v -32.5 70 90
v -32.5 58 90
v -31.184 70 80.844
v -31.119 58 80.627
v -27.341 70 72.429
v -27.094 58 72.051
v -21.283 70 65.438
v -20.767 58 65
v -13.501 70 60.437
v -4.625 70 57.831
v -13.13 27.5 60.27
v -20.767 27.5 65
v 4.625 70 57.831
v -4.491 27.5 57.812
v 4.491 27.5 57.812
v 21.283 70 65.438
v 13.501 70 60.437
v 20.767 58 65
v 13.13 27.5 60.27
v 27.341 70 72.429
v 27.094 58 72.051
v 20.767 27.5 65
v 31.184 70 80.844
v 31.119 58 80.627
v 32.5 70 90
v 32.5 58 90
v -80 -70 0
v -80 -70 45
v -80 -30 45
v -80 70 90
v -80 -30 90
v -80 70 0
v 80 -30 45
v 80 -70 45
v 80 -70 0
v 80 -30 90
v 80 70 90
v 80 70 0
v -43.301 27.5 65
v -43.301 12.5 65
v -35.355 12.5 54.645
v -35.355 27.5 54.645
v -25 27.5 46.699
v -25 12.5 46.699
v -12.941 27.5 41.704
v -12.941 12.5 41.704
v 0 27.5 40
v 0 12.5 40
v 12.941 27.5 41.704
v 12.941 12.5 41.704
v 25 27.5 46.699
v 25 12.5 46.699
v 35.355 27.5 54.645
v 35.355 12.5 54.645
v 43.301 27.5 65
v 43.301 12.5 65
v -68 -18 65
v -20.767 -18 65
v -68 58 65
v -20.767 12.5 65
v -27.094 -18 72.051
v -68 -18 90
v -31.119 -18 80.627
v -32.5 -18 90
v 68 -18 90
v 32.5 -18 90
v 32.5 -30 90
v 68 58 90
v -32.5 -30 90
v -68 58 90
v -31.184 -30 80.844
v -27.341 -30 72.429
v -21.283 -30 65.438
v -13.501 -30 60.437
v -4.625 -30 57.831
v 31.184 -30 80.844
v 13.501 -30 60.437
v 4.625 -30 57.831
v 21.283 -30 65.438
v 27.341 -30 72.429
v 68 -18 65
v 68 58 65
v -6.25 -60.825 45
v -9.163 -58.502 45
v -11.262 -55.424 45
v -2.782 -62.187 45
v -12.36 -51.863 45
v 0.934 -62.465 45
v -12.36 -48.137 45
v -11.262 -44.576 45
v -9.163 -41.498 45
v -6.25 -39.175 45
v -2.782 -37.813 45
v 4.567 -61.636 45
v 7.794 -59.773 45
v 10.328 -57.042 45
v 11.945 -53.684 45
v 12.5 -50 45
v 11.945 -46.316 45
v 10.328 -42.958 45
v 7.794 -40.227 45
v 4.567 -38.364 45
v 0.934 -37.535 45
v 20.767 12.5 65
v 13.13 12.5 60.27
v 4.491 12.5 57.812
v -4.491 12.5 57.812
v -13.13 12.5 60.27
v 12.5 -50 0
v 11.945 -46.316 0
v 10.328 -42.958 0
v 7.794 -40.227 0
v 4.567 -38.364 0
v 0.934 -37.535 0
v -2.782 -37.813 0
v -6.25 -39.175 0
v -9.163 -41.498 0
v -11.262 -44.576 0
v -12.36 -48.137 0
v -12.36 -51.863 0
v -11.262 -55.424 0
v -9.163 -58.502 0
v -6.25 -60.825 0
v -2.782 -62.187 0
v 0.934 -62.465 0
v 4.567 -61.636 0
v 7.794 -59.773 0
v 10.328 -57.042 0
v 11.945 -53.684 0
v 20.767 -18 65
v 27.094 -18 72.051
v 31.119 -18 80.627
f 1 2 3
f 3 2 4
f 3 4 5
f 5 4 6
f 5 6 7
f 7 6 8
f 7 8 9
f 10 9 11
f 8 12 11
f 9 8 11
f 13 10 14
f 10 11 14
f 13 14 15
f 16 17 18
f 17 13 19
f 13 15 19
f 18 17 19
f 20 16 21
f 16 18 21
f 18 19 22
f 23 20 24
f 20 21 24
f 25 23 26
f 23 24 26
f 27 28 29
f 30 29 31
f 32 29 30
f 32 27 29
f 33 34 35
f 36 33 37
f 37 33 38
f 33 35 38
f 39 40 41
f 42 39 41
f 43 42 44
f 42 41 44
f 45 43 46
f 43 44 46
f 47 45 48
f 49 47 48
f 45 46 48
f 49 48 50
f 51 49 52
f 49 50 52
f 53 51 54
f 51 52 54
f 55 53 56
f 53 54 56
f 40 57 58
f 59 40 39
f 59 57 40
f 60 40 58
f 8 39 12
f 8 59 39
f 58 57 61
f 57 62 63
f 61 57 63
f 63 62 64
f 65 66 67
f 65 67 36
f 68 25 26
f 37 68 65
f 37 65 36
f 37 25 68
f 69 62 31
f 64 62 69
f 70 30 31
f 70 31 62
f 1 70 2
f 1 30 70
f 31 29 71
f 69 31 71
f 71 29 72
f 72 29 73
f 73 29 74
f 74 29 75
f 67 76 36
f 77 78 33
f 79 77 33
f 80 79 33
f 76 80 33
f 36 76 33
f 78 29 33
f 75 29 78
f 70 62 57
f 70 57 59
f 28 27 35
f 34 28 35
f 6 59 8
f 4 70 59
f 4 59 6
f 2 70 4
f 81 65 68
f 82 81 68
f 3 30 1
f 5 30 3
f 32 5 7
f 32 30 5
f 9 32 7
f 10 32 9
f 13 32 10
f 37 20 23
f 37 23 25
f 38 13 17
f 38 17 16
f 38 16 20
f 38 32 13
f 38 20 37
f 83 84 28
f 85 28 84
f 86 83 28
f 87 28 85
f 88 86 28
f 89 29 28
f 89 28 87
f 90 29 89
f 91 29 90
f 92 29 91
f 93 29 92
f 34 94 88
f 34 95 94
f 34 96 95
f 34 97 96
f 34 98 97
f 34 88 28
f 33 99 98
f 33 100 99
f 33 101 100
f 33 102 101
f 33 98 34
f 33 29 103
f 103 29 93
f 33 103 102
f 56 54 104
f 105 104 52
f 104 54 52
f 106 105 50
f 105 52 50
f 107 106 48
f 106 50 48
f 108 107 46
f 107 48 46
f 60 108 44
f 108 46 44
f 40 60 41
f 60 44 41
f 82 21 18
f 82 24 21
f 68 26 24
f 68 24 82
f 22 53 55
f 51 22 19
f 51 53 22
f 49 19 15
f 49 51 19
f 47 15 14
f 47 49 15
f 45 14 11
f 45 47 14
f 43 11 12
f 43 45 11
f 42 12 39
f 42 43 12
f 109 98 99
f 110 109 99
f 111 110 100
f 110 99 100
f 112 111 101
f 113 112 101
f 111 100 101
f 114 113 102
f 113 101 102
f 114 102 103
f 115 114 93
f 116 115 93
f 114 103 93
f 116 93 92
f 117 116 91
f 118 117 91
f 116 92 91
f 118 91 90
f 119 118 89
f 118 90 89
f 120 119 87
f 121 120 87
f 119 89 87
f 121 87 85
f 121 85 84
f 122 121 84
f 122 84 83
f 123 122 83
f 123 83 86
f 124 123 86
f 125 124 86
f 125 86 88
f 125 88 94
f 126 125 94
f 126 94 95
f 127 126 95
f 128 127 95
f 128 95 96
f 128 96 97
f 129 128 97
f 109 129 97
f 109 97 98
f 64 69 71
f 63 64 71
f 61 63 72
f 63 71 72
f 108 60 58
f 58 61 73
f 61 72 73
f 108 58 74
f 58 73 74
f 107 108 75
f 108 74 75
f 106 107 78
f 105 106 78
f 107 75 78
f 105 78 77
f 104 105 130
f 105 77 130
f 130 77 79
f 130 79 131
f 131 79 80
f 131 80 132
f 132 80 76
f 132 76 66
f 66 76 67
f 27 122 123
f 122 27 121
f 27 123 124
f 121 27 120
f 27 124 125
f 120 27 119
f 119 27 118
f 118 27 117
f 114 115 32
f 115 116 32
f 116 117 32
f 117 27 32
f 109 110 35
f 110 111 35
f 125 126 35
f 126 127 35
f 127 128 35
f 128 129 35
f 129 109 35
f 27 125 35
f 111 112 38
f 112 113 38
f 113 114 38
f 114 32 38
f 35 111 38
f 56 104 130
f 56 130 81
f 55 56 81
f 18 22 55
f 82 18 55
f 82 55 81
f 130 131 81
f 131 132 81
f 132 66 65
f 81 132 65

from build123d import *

# Parameters (mm, degrees)
SKETCH_1_W          = 160
SKETCH_1_H          = 140
EXTRUDE_1_DEPTH     = 45
SKETCH_2_W          = 160
SKETCH_2_H          = 100
EXTRUDE_2_DEPTH     = 45
SKETCH_3_R          = 12.5
CUT_EXTRUDE_1_DEPTH = 116.433963806
SKETCH_4_R          = 32.5
CUT_EXTRUDE_2_DEPTH = 157.524758425
SKETCH_5_R          = 50
CUT_EXTRUDE_3_DEPTH = 7.5
SKETCH_7_W          = 136
SKETCH_7_H          = 76
CUT_EXTRUDE_4_DEPTH = 25


with BuildPart() as part:
    # Эскиз1 → Бобышка-Вытянуть1 (new body)
    with BuildSketch(Plane.XY):
        Rectangle(SKETCH_1_W, SKETCH_1_H)
    extrude(amount=EXTRUDE_1_DEPTH)

    # Эскиз2 → Бобышка-Вытянуть2 (add)
    with BuildSketch(Plane.XY.offset(45)):
        with Locations((0, 20)):
            Rectangle(SKETCH_2_W, SKETCH_2_H)
    extrude(amount=EXTRUDE_2_DEPTH)

    # Эскиз3 → Вырез-Вытянуть1 (cut, through all)
    with BuildSketch(Plane.XY.offset(45)):
        with Locations((0, -50)):
            Circle(SKETCH_3_R)
    extrude(amount=-CUT_EXTRUDE_1_DEPTH, mode=Mode.SUBTRACT)

    # Эскиз4 → Вырез-Вытянуть2 (cut, through all)
    with BuildSketch(Plane.XZ.offset(30)):
        with Locations((0, 90)):
            Circle(SKETCH_4_R)
    extrude(amount=-CUT_EXTRUDE_2_DEPTH, mode=Mode.SUBTRACT)

    # Эскиз5 → Вырез-Вытянуть3 (cut, symmetric)
    with BuildSketch(Plane(origin=(0, 20, 0), x_dir=(-1, 0, 0), z_dir=(0, -1, 0))):
        with Locations((0, -90)):
            Circle(SKETCH_5_R)
    extrude(amount=CUT_EXTRUDE_3_DEPTH, both=True, mode=Mode.SUBTRACT)

    # Эскиз7 → Вырез-Вытянуть4 (cut)
    with BuildSketch(Plane.XY.offset(90)):
        with Locations((0, 20)):
            Rectangle(SKETCH_7_W, SKETCH_7_H)
    extrude(amount=-CUT_EXTRUDE_4_DEPTH, mode=Mode.SUBTRACT)


solid = part.part
